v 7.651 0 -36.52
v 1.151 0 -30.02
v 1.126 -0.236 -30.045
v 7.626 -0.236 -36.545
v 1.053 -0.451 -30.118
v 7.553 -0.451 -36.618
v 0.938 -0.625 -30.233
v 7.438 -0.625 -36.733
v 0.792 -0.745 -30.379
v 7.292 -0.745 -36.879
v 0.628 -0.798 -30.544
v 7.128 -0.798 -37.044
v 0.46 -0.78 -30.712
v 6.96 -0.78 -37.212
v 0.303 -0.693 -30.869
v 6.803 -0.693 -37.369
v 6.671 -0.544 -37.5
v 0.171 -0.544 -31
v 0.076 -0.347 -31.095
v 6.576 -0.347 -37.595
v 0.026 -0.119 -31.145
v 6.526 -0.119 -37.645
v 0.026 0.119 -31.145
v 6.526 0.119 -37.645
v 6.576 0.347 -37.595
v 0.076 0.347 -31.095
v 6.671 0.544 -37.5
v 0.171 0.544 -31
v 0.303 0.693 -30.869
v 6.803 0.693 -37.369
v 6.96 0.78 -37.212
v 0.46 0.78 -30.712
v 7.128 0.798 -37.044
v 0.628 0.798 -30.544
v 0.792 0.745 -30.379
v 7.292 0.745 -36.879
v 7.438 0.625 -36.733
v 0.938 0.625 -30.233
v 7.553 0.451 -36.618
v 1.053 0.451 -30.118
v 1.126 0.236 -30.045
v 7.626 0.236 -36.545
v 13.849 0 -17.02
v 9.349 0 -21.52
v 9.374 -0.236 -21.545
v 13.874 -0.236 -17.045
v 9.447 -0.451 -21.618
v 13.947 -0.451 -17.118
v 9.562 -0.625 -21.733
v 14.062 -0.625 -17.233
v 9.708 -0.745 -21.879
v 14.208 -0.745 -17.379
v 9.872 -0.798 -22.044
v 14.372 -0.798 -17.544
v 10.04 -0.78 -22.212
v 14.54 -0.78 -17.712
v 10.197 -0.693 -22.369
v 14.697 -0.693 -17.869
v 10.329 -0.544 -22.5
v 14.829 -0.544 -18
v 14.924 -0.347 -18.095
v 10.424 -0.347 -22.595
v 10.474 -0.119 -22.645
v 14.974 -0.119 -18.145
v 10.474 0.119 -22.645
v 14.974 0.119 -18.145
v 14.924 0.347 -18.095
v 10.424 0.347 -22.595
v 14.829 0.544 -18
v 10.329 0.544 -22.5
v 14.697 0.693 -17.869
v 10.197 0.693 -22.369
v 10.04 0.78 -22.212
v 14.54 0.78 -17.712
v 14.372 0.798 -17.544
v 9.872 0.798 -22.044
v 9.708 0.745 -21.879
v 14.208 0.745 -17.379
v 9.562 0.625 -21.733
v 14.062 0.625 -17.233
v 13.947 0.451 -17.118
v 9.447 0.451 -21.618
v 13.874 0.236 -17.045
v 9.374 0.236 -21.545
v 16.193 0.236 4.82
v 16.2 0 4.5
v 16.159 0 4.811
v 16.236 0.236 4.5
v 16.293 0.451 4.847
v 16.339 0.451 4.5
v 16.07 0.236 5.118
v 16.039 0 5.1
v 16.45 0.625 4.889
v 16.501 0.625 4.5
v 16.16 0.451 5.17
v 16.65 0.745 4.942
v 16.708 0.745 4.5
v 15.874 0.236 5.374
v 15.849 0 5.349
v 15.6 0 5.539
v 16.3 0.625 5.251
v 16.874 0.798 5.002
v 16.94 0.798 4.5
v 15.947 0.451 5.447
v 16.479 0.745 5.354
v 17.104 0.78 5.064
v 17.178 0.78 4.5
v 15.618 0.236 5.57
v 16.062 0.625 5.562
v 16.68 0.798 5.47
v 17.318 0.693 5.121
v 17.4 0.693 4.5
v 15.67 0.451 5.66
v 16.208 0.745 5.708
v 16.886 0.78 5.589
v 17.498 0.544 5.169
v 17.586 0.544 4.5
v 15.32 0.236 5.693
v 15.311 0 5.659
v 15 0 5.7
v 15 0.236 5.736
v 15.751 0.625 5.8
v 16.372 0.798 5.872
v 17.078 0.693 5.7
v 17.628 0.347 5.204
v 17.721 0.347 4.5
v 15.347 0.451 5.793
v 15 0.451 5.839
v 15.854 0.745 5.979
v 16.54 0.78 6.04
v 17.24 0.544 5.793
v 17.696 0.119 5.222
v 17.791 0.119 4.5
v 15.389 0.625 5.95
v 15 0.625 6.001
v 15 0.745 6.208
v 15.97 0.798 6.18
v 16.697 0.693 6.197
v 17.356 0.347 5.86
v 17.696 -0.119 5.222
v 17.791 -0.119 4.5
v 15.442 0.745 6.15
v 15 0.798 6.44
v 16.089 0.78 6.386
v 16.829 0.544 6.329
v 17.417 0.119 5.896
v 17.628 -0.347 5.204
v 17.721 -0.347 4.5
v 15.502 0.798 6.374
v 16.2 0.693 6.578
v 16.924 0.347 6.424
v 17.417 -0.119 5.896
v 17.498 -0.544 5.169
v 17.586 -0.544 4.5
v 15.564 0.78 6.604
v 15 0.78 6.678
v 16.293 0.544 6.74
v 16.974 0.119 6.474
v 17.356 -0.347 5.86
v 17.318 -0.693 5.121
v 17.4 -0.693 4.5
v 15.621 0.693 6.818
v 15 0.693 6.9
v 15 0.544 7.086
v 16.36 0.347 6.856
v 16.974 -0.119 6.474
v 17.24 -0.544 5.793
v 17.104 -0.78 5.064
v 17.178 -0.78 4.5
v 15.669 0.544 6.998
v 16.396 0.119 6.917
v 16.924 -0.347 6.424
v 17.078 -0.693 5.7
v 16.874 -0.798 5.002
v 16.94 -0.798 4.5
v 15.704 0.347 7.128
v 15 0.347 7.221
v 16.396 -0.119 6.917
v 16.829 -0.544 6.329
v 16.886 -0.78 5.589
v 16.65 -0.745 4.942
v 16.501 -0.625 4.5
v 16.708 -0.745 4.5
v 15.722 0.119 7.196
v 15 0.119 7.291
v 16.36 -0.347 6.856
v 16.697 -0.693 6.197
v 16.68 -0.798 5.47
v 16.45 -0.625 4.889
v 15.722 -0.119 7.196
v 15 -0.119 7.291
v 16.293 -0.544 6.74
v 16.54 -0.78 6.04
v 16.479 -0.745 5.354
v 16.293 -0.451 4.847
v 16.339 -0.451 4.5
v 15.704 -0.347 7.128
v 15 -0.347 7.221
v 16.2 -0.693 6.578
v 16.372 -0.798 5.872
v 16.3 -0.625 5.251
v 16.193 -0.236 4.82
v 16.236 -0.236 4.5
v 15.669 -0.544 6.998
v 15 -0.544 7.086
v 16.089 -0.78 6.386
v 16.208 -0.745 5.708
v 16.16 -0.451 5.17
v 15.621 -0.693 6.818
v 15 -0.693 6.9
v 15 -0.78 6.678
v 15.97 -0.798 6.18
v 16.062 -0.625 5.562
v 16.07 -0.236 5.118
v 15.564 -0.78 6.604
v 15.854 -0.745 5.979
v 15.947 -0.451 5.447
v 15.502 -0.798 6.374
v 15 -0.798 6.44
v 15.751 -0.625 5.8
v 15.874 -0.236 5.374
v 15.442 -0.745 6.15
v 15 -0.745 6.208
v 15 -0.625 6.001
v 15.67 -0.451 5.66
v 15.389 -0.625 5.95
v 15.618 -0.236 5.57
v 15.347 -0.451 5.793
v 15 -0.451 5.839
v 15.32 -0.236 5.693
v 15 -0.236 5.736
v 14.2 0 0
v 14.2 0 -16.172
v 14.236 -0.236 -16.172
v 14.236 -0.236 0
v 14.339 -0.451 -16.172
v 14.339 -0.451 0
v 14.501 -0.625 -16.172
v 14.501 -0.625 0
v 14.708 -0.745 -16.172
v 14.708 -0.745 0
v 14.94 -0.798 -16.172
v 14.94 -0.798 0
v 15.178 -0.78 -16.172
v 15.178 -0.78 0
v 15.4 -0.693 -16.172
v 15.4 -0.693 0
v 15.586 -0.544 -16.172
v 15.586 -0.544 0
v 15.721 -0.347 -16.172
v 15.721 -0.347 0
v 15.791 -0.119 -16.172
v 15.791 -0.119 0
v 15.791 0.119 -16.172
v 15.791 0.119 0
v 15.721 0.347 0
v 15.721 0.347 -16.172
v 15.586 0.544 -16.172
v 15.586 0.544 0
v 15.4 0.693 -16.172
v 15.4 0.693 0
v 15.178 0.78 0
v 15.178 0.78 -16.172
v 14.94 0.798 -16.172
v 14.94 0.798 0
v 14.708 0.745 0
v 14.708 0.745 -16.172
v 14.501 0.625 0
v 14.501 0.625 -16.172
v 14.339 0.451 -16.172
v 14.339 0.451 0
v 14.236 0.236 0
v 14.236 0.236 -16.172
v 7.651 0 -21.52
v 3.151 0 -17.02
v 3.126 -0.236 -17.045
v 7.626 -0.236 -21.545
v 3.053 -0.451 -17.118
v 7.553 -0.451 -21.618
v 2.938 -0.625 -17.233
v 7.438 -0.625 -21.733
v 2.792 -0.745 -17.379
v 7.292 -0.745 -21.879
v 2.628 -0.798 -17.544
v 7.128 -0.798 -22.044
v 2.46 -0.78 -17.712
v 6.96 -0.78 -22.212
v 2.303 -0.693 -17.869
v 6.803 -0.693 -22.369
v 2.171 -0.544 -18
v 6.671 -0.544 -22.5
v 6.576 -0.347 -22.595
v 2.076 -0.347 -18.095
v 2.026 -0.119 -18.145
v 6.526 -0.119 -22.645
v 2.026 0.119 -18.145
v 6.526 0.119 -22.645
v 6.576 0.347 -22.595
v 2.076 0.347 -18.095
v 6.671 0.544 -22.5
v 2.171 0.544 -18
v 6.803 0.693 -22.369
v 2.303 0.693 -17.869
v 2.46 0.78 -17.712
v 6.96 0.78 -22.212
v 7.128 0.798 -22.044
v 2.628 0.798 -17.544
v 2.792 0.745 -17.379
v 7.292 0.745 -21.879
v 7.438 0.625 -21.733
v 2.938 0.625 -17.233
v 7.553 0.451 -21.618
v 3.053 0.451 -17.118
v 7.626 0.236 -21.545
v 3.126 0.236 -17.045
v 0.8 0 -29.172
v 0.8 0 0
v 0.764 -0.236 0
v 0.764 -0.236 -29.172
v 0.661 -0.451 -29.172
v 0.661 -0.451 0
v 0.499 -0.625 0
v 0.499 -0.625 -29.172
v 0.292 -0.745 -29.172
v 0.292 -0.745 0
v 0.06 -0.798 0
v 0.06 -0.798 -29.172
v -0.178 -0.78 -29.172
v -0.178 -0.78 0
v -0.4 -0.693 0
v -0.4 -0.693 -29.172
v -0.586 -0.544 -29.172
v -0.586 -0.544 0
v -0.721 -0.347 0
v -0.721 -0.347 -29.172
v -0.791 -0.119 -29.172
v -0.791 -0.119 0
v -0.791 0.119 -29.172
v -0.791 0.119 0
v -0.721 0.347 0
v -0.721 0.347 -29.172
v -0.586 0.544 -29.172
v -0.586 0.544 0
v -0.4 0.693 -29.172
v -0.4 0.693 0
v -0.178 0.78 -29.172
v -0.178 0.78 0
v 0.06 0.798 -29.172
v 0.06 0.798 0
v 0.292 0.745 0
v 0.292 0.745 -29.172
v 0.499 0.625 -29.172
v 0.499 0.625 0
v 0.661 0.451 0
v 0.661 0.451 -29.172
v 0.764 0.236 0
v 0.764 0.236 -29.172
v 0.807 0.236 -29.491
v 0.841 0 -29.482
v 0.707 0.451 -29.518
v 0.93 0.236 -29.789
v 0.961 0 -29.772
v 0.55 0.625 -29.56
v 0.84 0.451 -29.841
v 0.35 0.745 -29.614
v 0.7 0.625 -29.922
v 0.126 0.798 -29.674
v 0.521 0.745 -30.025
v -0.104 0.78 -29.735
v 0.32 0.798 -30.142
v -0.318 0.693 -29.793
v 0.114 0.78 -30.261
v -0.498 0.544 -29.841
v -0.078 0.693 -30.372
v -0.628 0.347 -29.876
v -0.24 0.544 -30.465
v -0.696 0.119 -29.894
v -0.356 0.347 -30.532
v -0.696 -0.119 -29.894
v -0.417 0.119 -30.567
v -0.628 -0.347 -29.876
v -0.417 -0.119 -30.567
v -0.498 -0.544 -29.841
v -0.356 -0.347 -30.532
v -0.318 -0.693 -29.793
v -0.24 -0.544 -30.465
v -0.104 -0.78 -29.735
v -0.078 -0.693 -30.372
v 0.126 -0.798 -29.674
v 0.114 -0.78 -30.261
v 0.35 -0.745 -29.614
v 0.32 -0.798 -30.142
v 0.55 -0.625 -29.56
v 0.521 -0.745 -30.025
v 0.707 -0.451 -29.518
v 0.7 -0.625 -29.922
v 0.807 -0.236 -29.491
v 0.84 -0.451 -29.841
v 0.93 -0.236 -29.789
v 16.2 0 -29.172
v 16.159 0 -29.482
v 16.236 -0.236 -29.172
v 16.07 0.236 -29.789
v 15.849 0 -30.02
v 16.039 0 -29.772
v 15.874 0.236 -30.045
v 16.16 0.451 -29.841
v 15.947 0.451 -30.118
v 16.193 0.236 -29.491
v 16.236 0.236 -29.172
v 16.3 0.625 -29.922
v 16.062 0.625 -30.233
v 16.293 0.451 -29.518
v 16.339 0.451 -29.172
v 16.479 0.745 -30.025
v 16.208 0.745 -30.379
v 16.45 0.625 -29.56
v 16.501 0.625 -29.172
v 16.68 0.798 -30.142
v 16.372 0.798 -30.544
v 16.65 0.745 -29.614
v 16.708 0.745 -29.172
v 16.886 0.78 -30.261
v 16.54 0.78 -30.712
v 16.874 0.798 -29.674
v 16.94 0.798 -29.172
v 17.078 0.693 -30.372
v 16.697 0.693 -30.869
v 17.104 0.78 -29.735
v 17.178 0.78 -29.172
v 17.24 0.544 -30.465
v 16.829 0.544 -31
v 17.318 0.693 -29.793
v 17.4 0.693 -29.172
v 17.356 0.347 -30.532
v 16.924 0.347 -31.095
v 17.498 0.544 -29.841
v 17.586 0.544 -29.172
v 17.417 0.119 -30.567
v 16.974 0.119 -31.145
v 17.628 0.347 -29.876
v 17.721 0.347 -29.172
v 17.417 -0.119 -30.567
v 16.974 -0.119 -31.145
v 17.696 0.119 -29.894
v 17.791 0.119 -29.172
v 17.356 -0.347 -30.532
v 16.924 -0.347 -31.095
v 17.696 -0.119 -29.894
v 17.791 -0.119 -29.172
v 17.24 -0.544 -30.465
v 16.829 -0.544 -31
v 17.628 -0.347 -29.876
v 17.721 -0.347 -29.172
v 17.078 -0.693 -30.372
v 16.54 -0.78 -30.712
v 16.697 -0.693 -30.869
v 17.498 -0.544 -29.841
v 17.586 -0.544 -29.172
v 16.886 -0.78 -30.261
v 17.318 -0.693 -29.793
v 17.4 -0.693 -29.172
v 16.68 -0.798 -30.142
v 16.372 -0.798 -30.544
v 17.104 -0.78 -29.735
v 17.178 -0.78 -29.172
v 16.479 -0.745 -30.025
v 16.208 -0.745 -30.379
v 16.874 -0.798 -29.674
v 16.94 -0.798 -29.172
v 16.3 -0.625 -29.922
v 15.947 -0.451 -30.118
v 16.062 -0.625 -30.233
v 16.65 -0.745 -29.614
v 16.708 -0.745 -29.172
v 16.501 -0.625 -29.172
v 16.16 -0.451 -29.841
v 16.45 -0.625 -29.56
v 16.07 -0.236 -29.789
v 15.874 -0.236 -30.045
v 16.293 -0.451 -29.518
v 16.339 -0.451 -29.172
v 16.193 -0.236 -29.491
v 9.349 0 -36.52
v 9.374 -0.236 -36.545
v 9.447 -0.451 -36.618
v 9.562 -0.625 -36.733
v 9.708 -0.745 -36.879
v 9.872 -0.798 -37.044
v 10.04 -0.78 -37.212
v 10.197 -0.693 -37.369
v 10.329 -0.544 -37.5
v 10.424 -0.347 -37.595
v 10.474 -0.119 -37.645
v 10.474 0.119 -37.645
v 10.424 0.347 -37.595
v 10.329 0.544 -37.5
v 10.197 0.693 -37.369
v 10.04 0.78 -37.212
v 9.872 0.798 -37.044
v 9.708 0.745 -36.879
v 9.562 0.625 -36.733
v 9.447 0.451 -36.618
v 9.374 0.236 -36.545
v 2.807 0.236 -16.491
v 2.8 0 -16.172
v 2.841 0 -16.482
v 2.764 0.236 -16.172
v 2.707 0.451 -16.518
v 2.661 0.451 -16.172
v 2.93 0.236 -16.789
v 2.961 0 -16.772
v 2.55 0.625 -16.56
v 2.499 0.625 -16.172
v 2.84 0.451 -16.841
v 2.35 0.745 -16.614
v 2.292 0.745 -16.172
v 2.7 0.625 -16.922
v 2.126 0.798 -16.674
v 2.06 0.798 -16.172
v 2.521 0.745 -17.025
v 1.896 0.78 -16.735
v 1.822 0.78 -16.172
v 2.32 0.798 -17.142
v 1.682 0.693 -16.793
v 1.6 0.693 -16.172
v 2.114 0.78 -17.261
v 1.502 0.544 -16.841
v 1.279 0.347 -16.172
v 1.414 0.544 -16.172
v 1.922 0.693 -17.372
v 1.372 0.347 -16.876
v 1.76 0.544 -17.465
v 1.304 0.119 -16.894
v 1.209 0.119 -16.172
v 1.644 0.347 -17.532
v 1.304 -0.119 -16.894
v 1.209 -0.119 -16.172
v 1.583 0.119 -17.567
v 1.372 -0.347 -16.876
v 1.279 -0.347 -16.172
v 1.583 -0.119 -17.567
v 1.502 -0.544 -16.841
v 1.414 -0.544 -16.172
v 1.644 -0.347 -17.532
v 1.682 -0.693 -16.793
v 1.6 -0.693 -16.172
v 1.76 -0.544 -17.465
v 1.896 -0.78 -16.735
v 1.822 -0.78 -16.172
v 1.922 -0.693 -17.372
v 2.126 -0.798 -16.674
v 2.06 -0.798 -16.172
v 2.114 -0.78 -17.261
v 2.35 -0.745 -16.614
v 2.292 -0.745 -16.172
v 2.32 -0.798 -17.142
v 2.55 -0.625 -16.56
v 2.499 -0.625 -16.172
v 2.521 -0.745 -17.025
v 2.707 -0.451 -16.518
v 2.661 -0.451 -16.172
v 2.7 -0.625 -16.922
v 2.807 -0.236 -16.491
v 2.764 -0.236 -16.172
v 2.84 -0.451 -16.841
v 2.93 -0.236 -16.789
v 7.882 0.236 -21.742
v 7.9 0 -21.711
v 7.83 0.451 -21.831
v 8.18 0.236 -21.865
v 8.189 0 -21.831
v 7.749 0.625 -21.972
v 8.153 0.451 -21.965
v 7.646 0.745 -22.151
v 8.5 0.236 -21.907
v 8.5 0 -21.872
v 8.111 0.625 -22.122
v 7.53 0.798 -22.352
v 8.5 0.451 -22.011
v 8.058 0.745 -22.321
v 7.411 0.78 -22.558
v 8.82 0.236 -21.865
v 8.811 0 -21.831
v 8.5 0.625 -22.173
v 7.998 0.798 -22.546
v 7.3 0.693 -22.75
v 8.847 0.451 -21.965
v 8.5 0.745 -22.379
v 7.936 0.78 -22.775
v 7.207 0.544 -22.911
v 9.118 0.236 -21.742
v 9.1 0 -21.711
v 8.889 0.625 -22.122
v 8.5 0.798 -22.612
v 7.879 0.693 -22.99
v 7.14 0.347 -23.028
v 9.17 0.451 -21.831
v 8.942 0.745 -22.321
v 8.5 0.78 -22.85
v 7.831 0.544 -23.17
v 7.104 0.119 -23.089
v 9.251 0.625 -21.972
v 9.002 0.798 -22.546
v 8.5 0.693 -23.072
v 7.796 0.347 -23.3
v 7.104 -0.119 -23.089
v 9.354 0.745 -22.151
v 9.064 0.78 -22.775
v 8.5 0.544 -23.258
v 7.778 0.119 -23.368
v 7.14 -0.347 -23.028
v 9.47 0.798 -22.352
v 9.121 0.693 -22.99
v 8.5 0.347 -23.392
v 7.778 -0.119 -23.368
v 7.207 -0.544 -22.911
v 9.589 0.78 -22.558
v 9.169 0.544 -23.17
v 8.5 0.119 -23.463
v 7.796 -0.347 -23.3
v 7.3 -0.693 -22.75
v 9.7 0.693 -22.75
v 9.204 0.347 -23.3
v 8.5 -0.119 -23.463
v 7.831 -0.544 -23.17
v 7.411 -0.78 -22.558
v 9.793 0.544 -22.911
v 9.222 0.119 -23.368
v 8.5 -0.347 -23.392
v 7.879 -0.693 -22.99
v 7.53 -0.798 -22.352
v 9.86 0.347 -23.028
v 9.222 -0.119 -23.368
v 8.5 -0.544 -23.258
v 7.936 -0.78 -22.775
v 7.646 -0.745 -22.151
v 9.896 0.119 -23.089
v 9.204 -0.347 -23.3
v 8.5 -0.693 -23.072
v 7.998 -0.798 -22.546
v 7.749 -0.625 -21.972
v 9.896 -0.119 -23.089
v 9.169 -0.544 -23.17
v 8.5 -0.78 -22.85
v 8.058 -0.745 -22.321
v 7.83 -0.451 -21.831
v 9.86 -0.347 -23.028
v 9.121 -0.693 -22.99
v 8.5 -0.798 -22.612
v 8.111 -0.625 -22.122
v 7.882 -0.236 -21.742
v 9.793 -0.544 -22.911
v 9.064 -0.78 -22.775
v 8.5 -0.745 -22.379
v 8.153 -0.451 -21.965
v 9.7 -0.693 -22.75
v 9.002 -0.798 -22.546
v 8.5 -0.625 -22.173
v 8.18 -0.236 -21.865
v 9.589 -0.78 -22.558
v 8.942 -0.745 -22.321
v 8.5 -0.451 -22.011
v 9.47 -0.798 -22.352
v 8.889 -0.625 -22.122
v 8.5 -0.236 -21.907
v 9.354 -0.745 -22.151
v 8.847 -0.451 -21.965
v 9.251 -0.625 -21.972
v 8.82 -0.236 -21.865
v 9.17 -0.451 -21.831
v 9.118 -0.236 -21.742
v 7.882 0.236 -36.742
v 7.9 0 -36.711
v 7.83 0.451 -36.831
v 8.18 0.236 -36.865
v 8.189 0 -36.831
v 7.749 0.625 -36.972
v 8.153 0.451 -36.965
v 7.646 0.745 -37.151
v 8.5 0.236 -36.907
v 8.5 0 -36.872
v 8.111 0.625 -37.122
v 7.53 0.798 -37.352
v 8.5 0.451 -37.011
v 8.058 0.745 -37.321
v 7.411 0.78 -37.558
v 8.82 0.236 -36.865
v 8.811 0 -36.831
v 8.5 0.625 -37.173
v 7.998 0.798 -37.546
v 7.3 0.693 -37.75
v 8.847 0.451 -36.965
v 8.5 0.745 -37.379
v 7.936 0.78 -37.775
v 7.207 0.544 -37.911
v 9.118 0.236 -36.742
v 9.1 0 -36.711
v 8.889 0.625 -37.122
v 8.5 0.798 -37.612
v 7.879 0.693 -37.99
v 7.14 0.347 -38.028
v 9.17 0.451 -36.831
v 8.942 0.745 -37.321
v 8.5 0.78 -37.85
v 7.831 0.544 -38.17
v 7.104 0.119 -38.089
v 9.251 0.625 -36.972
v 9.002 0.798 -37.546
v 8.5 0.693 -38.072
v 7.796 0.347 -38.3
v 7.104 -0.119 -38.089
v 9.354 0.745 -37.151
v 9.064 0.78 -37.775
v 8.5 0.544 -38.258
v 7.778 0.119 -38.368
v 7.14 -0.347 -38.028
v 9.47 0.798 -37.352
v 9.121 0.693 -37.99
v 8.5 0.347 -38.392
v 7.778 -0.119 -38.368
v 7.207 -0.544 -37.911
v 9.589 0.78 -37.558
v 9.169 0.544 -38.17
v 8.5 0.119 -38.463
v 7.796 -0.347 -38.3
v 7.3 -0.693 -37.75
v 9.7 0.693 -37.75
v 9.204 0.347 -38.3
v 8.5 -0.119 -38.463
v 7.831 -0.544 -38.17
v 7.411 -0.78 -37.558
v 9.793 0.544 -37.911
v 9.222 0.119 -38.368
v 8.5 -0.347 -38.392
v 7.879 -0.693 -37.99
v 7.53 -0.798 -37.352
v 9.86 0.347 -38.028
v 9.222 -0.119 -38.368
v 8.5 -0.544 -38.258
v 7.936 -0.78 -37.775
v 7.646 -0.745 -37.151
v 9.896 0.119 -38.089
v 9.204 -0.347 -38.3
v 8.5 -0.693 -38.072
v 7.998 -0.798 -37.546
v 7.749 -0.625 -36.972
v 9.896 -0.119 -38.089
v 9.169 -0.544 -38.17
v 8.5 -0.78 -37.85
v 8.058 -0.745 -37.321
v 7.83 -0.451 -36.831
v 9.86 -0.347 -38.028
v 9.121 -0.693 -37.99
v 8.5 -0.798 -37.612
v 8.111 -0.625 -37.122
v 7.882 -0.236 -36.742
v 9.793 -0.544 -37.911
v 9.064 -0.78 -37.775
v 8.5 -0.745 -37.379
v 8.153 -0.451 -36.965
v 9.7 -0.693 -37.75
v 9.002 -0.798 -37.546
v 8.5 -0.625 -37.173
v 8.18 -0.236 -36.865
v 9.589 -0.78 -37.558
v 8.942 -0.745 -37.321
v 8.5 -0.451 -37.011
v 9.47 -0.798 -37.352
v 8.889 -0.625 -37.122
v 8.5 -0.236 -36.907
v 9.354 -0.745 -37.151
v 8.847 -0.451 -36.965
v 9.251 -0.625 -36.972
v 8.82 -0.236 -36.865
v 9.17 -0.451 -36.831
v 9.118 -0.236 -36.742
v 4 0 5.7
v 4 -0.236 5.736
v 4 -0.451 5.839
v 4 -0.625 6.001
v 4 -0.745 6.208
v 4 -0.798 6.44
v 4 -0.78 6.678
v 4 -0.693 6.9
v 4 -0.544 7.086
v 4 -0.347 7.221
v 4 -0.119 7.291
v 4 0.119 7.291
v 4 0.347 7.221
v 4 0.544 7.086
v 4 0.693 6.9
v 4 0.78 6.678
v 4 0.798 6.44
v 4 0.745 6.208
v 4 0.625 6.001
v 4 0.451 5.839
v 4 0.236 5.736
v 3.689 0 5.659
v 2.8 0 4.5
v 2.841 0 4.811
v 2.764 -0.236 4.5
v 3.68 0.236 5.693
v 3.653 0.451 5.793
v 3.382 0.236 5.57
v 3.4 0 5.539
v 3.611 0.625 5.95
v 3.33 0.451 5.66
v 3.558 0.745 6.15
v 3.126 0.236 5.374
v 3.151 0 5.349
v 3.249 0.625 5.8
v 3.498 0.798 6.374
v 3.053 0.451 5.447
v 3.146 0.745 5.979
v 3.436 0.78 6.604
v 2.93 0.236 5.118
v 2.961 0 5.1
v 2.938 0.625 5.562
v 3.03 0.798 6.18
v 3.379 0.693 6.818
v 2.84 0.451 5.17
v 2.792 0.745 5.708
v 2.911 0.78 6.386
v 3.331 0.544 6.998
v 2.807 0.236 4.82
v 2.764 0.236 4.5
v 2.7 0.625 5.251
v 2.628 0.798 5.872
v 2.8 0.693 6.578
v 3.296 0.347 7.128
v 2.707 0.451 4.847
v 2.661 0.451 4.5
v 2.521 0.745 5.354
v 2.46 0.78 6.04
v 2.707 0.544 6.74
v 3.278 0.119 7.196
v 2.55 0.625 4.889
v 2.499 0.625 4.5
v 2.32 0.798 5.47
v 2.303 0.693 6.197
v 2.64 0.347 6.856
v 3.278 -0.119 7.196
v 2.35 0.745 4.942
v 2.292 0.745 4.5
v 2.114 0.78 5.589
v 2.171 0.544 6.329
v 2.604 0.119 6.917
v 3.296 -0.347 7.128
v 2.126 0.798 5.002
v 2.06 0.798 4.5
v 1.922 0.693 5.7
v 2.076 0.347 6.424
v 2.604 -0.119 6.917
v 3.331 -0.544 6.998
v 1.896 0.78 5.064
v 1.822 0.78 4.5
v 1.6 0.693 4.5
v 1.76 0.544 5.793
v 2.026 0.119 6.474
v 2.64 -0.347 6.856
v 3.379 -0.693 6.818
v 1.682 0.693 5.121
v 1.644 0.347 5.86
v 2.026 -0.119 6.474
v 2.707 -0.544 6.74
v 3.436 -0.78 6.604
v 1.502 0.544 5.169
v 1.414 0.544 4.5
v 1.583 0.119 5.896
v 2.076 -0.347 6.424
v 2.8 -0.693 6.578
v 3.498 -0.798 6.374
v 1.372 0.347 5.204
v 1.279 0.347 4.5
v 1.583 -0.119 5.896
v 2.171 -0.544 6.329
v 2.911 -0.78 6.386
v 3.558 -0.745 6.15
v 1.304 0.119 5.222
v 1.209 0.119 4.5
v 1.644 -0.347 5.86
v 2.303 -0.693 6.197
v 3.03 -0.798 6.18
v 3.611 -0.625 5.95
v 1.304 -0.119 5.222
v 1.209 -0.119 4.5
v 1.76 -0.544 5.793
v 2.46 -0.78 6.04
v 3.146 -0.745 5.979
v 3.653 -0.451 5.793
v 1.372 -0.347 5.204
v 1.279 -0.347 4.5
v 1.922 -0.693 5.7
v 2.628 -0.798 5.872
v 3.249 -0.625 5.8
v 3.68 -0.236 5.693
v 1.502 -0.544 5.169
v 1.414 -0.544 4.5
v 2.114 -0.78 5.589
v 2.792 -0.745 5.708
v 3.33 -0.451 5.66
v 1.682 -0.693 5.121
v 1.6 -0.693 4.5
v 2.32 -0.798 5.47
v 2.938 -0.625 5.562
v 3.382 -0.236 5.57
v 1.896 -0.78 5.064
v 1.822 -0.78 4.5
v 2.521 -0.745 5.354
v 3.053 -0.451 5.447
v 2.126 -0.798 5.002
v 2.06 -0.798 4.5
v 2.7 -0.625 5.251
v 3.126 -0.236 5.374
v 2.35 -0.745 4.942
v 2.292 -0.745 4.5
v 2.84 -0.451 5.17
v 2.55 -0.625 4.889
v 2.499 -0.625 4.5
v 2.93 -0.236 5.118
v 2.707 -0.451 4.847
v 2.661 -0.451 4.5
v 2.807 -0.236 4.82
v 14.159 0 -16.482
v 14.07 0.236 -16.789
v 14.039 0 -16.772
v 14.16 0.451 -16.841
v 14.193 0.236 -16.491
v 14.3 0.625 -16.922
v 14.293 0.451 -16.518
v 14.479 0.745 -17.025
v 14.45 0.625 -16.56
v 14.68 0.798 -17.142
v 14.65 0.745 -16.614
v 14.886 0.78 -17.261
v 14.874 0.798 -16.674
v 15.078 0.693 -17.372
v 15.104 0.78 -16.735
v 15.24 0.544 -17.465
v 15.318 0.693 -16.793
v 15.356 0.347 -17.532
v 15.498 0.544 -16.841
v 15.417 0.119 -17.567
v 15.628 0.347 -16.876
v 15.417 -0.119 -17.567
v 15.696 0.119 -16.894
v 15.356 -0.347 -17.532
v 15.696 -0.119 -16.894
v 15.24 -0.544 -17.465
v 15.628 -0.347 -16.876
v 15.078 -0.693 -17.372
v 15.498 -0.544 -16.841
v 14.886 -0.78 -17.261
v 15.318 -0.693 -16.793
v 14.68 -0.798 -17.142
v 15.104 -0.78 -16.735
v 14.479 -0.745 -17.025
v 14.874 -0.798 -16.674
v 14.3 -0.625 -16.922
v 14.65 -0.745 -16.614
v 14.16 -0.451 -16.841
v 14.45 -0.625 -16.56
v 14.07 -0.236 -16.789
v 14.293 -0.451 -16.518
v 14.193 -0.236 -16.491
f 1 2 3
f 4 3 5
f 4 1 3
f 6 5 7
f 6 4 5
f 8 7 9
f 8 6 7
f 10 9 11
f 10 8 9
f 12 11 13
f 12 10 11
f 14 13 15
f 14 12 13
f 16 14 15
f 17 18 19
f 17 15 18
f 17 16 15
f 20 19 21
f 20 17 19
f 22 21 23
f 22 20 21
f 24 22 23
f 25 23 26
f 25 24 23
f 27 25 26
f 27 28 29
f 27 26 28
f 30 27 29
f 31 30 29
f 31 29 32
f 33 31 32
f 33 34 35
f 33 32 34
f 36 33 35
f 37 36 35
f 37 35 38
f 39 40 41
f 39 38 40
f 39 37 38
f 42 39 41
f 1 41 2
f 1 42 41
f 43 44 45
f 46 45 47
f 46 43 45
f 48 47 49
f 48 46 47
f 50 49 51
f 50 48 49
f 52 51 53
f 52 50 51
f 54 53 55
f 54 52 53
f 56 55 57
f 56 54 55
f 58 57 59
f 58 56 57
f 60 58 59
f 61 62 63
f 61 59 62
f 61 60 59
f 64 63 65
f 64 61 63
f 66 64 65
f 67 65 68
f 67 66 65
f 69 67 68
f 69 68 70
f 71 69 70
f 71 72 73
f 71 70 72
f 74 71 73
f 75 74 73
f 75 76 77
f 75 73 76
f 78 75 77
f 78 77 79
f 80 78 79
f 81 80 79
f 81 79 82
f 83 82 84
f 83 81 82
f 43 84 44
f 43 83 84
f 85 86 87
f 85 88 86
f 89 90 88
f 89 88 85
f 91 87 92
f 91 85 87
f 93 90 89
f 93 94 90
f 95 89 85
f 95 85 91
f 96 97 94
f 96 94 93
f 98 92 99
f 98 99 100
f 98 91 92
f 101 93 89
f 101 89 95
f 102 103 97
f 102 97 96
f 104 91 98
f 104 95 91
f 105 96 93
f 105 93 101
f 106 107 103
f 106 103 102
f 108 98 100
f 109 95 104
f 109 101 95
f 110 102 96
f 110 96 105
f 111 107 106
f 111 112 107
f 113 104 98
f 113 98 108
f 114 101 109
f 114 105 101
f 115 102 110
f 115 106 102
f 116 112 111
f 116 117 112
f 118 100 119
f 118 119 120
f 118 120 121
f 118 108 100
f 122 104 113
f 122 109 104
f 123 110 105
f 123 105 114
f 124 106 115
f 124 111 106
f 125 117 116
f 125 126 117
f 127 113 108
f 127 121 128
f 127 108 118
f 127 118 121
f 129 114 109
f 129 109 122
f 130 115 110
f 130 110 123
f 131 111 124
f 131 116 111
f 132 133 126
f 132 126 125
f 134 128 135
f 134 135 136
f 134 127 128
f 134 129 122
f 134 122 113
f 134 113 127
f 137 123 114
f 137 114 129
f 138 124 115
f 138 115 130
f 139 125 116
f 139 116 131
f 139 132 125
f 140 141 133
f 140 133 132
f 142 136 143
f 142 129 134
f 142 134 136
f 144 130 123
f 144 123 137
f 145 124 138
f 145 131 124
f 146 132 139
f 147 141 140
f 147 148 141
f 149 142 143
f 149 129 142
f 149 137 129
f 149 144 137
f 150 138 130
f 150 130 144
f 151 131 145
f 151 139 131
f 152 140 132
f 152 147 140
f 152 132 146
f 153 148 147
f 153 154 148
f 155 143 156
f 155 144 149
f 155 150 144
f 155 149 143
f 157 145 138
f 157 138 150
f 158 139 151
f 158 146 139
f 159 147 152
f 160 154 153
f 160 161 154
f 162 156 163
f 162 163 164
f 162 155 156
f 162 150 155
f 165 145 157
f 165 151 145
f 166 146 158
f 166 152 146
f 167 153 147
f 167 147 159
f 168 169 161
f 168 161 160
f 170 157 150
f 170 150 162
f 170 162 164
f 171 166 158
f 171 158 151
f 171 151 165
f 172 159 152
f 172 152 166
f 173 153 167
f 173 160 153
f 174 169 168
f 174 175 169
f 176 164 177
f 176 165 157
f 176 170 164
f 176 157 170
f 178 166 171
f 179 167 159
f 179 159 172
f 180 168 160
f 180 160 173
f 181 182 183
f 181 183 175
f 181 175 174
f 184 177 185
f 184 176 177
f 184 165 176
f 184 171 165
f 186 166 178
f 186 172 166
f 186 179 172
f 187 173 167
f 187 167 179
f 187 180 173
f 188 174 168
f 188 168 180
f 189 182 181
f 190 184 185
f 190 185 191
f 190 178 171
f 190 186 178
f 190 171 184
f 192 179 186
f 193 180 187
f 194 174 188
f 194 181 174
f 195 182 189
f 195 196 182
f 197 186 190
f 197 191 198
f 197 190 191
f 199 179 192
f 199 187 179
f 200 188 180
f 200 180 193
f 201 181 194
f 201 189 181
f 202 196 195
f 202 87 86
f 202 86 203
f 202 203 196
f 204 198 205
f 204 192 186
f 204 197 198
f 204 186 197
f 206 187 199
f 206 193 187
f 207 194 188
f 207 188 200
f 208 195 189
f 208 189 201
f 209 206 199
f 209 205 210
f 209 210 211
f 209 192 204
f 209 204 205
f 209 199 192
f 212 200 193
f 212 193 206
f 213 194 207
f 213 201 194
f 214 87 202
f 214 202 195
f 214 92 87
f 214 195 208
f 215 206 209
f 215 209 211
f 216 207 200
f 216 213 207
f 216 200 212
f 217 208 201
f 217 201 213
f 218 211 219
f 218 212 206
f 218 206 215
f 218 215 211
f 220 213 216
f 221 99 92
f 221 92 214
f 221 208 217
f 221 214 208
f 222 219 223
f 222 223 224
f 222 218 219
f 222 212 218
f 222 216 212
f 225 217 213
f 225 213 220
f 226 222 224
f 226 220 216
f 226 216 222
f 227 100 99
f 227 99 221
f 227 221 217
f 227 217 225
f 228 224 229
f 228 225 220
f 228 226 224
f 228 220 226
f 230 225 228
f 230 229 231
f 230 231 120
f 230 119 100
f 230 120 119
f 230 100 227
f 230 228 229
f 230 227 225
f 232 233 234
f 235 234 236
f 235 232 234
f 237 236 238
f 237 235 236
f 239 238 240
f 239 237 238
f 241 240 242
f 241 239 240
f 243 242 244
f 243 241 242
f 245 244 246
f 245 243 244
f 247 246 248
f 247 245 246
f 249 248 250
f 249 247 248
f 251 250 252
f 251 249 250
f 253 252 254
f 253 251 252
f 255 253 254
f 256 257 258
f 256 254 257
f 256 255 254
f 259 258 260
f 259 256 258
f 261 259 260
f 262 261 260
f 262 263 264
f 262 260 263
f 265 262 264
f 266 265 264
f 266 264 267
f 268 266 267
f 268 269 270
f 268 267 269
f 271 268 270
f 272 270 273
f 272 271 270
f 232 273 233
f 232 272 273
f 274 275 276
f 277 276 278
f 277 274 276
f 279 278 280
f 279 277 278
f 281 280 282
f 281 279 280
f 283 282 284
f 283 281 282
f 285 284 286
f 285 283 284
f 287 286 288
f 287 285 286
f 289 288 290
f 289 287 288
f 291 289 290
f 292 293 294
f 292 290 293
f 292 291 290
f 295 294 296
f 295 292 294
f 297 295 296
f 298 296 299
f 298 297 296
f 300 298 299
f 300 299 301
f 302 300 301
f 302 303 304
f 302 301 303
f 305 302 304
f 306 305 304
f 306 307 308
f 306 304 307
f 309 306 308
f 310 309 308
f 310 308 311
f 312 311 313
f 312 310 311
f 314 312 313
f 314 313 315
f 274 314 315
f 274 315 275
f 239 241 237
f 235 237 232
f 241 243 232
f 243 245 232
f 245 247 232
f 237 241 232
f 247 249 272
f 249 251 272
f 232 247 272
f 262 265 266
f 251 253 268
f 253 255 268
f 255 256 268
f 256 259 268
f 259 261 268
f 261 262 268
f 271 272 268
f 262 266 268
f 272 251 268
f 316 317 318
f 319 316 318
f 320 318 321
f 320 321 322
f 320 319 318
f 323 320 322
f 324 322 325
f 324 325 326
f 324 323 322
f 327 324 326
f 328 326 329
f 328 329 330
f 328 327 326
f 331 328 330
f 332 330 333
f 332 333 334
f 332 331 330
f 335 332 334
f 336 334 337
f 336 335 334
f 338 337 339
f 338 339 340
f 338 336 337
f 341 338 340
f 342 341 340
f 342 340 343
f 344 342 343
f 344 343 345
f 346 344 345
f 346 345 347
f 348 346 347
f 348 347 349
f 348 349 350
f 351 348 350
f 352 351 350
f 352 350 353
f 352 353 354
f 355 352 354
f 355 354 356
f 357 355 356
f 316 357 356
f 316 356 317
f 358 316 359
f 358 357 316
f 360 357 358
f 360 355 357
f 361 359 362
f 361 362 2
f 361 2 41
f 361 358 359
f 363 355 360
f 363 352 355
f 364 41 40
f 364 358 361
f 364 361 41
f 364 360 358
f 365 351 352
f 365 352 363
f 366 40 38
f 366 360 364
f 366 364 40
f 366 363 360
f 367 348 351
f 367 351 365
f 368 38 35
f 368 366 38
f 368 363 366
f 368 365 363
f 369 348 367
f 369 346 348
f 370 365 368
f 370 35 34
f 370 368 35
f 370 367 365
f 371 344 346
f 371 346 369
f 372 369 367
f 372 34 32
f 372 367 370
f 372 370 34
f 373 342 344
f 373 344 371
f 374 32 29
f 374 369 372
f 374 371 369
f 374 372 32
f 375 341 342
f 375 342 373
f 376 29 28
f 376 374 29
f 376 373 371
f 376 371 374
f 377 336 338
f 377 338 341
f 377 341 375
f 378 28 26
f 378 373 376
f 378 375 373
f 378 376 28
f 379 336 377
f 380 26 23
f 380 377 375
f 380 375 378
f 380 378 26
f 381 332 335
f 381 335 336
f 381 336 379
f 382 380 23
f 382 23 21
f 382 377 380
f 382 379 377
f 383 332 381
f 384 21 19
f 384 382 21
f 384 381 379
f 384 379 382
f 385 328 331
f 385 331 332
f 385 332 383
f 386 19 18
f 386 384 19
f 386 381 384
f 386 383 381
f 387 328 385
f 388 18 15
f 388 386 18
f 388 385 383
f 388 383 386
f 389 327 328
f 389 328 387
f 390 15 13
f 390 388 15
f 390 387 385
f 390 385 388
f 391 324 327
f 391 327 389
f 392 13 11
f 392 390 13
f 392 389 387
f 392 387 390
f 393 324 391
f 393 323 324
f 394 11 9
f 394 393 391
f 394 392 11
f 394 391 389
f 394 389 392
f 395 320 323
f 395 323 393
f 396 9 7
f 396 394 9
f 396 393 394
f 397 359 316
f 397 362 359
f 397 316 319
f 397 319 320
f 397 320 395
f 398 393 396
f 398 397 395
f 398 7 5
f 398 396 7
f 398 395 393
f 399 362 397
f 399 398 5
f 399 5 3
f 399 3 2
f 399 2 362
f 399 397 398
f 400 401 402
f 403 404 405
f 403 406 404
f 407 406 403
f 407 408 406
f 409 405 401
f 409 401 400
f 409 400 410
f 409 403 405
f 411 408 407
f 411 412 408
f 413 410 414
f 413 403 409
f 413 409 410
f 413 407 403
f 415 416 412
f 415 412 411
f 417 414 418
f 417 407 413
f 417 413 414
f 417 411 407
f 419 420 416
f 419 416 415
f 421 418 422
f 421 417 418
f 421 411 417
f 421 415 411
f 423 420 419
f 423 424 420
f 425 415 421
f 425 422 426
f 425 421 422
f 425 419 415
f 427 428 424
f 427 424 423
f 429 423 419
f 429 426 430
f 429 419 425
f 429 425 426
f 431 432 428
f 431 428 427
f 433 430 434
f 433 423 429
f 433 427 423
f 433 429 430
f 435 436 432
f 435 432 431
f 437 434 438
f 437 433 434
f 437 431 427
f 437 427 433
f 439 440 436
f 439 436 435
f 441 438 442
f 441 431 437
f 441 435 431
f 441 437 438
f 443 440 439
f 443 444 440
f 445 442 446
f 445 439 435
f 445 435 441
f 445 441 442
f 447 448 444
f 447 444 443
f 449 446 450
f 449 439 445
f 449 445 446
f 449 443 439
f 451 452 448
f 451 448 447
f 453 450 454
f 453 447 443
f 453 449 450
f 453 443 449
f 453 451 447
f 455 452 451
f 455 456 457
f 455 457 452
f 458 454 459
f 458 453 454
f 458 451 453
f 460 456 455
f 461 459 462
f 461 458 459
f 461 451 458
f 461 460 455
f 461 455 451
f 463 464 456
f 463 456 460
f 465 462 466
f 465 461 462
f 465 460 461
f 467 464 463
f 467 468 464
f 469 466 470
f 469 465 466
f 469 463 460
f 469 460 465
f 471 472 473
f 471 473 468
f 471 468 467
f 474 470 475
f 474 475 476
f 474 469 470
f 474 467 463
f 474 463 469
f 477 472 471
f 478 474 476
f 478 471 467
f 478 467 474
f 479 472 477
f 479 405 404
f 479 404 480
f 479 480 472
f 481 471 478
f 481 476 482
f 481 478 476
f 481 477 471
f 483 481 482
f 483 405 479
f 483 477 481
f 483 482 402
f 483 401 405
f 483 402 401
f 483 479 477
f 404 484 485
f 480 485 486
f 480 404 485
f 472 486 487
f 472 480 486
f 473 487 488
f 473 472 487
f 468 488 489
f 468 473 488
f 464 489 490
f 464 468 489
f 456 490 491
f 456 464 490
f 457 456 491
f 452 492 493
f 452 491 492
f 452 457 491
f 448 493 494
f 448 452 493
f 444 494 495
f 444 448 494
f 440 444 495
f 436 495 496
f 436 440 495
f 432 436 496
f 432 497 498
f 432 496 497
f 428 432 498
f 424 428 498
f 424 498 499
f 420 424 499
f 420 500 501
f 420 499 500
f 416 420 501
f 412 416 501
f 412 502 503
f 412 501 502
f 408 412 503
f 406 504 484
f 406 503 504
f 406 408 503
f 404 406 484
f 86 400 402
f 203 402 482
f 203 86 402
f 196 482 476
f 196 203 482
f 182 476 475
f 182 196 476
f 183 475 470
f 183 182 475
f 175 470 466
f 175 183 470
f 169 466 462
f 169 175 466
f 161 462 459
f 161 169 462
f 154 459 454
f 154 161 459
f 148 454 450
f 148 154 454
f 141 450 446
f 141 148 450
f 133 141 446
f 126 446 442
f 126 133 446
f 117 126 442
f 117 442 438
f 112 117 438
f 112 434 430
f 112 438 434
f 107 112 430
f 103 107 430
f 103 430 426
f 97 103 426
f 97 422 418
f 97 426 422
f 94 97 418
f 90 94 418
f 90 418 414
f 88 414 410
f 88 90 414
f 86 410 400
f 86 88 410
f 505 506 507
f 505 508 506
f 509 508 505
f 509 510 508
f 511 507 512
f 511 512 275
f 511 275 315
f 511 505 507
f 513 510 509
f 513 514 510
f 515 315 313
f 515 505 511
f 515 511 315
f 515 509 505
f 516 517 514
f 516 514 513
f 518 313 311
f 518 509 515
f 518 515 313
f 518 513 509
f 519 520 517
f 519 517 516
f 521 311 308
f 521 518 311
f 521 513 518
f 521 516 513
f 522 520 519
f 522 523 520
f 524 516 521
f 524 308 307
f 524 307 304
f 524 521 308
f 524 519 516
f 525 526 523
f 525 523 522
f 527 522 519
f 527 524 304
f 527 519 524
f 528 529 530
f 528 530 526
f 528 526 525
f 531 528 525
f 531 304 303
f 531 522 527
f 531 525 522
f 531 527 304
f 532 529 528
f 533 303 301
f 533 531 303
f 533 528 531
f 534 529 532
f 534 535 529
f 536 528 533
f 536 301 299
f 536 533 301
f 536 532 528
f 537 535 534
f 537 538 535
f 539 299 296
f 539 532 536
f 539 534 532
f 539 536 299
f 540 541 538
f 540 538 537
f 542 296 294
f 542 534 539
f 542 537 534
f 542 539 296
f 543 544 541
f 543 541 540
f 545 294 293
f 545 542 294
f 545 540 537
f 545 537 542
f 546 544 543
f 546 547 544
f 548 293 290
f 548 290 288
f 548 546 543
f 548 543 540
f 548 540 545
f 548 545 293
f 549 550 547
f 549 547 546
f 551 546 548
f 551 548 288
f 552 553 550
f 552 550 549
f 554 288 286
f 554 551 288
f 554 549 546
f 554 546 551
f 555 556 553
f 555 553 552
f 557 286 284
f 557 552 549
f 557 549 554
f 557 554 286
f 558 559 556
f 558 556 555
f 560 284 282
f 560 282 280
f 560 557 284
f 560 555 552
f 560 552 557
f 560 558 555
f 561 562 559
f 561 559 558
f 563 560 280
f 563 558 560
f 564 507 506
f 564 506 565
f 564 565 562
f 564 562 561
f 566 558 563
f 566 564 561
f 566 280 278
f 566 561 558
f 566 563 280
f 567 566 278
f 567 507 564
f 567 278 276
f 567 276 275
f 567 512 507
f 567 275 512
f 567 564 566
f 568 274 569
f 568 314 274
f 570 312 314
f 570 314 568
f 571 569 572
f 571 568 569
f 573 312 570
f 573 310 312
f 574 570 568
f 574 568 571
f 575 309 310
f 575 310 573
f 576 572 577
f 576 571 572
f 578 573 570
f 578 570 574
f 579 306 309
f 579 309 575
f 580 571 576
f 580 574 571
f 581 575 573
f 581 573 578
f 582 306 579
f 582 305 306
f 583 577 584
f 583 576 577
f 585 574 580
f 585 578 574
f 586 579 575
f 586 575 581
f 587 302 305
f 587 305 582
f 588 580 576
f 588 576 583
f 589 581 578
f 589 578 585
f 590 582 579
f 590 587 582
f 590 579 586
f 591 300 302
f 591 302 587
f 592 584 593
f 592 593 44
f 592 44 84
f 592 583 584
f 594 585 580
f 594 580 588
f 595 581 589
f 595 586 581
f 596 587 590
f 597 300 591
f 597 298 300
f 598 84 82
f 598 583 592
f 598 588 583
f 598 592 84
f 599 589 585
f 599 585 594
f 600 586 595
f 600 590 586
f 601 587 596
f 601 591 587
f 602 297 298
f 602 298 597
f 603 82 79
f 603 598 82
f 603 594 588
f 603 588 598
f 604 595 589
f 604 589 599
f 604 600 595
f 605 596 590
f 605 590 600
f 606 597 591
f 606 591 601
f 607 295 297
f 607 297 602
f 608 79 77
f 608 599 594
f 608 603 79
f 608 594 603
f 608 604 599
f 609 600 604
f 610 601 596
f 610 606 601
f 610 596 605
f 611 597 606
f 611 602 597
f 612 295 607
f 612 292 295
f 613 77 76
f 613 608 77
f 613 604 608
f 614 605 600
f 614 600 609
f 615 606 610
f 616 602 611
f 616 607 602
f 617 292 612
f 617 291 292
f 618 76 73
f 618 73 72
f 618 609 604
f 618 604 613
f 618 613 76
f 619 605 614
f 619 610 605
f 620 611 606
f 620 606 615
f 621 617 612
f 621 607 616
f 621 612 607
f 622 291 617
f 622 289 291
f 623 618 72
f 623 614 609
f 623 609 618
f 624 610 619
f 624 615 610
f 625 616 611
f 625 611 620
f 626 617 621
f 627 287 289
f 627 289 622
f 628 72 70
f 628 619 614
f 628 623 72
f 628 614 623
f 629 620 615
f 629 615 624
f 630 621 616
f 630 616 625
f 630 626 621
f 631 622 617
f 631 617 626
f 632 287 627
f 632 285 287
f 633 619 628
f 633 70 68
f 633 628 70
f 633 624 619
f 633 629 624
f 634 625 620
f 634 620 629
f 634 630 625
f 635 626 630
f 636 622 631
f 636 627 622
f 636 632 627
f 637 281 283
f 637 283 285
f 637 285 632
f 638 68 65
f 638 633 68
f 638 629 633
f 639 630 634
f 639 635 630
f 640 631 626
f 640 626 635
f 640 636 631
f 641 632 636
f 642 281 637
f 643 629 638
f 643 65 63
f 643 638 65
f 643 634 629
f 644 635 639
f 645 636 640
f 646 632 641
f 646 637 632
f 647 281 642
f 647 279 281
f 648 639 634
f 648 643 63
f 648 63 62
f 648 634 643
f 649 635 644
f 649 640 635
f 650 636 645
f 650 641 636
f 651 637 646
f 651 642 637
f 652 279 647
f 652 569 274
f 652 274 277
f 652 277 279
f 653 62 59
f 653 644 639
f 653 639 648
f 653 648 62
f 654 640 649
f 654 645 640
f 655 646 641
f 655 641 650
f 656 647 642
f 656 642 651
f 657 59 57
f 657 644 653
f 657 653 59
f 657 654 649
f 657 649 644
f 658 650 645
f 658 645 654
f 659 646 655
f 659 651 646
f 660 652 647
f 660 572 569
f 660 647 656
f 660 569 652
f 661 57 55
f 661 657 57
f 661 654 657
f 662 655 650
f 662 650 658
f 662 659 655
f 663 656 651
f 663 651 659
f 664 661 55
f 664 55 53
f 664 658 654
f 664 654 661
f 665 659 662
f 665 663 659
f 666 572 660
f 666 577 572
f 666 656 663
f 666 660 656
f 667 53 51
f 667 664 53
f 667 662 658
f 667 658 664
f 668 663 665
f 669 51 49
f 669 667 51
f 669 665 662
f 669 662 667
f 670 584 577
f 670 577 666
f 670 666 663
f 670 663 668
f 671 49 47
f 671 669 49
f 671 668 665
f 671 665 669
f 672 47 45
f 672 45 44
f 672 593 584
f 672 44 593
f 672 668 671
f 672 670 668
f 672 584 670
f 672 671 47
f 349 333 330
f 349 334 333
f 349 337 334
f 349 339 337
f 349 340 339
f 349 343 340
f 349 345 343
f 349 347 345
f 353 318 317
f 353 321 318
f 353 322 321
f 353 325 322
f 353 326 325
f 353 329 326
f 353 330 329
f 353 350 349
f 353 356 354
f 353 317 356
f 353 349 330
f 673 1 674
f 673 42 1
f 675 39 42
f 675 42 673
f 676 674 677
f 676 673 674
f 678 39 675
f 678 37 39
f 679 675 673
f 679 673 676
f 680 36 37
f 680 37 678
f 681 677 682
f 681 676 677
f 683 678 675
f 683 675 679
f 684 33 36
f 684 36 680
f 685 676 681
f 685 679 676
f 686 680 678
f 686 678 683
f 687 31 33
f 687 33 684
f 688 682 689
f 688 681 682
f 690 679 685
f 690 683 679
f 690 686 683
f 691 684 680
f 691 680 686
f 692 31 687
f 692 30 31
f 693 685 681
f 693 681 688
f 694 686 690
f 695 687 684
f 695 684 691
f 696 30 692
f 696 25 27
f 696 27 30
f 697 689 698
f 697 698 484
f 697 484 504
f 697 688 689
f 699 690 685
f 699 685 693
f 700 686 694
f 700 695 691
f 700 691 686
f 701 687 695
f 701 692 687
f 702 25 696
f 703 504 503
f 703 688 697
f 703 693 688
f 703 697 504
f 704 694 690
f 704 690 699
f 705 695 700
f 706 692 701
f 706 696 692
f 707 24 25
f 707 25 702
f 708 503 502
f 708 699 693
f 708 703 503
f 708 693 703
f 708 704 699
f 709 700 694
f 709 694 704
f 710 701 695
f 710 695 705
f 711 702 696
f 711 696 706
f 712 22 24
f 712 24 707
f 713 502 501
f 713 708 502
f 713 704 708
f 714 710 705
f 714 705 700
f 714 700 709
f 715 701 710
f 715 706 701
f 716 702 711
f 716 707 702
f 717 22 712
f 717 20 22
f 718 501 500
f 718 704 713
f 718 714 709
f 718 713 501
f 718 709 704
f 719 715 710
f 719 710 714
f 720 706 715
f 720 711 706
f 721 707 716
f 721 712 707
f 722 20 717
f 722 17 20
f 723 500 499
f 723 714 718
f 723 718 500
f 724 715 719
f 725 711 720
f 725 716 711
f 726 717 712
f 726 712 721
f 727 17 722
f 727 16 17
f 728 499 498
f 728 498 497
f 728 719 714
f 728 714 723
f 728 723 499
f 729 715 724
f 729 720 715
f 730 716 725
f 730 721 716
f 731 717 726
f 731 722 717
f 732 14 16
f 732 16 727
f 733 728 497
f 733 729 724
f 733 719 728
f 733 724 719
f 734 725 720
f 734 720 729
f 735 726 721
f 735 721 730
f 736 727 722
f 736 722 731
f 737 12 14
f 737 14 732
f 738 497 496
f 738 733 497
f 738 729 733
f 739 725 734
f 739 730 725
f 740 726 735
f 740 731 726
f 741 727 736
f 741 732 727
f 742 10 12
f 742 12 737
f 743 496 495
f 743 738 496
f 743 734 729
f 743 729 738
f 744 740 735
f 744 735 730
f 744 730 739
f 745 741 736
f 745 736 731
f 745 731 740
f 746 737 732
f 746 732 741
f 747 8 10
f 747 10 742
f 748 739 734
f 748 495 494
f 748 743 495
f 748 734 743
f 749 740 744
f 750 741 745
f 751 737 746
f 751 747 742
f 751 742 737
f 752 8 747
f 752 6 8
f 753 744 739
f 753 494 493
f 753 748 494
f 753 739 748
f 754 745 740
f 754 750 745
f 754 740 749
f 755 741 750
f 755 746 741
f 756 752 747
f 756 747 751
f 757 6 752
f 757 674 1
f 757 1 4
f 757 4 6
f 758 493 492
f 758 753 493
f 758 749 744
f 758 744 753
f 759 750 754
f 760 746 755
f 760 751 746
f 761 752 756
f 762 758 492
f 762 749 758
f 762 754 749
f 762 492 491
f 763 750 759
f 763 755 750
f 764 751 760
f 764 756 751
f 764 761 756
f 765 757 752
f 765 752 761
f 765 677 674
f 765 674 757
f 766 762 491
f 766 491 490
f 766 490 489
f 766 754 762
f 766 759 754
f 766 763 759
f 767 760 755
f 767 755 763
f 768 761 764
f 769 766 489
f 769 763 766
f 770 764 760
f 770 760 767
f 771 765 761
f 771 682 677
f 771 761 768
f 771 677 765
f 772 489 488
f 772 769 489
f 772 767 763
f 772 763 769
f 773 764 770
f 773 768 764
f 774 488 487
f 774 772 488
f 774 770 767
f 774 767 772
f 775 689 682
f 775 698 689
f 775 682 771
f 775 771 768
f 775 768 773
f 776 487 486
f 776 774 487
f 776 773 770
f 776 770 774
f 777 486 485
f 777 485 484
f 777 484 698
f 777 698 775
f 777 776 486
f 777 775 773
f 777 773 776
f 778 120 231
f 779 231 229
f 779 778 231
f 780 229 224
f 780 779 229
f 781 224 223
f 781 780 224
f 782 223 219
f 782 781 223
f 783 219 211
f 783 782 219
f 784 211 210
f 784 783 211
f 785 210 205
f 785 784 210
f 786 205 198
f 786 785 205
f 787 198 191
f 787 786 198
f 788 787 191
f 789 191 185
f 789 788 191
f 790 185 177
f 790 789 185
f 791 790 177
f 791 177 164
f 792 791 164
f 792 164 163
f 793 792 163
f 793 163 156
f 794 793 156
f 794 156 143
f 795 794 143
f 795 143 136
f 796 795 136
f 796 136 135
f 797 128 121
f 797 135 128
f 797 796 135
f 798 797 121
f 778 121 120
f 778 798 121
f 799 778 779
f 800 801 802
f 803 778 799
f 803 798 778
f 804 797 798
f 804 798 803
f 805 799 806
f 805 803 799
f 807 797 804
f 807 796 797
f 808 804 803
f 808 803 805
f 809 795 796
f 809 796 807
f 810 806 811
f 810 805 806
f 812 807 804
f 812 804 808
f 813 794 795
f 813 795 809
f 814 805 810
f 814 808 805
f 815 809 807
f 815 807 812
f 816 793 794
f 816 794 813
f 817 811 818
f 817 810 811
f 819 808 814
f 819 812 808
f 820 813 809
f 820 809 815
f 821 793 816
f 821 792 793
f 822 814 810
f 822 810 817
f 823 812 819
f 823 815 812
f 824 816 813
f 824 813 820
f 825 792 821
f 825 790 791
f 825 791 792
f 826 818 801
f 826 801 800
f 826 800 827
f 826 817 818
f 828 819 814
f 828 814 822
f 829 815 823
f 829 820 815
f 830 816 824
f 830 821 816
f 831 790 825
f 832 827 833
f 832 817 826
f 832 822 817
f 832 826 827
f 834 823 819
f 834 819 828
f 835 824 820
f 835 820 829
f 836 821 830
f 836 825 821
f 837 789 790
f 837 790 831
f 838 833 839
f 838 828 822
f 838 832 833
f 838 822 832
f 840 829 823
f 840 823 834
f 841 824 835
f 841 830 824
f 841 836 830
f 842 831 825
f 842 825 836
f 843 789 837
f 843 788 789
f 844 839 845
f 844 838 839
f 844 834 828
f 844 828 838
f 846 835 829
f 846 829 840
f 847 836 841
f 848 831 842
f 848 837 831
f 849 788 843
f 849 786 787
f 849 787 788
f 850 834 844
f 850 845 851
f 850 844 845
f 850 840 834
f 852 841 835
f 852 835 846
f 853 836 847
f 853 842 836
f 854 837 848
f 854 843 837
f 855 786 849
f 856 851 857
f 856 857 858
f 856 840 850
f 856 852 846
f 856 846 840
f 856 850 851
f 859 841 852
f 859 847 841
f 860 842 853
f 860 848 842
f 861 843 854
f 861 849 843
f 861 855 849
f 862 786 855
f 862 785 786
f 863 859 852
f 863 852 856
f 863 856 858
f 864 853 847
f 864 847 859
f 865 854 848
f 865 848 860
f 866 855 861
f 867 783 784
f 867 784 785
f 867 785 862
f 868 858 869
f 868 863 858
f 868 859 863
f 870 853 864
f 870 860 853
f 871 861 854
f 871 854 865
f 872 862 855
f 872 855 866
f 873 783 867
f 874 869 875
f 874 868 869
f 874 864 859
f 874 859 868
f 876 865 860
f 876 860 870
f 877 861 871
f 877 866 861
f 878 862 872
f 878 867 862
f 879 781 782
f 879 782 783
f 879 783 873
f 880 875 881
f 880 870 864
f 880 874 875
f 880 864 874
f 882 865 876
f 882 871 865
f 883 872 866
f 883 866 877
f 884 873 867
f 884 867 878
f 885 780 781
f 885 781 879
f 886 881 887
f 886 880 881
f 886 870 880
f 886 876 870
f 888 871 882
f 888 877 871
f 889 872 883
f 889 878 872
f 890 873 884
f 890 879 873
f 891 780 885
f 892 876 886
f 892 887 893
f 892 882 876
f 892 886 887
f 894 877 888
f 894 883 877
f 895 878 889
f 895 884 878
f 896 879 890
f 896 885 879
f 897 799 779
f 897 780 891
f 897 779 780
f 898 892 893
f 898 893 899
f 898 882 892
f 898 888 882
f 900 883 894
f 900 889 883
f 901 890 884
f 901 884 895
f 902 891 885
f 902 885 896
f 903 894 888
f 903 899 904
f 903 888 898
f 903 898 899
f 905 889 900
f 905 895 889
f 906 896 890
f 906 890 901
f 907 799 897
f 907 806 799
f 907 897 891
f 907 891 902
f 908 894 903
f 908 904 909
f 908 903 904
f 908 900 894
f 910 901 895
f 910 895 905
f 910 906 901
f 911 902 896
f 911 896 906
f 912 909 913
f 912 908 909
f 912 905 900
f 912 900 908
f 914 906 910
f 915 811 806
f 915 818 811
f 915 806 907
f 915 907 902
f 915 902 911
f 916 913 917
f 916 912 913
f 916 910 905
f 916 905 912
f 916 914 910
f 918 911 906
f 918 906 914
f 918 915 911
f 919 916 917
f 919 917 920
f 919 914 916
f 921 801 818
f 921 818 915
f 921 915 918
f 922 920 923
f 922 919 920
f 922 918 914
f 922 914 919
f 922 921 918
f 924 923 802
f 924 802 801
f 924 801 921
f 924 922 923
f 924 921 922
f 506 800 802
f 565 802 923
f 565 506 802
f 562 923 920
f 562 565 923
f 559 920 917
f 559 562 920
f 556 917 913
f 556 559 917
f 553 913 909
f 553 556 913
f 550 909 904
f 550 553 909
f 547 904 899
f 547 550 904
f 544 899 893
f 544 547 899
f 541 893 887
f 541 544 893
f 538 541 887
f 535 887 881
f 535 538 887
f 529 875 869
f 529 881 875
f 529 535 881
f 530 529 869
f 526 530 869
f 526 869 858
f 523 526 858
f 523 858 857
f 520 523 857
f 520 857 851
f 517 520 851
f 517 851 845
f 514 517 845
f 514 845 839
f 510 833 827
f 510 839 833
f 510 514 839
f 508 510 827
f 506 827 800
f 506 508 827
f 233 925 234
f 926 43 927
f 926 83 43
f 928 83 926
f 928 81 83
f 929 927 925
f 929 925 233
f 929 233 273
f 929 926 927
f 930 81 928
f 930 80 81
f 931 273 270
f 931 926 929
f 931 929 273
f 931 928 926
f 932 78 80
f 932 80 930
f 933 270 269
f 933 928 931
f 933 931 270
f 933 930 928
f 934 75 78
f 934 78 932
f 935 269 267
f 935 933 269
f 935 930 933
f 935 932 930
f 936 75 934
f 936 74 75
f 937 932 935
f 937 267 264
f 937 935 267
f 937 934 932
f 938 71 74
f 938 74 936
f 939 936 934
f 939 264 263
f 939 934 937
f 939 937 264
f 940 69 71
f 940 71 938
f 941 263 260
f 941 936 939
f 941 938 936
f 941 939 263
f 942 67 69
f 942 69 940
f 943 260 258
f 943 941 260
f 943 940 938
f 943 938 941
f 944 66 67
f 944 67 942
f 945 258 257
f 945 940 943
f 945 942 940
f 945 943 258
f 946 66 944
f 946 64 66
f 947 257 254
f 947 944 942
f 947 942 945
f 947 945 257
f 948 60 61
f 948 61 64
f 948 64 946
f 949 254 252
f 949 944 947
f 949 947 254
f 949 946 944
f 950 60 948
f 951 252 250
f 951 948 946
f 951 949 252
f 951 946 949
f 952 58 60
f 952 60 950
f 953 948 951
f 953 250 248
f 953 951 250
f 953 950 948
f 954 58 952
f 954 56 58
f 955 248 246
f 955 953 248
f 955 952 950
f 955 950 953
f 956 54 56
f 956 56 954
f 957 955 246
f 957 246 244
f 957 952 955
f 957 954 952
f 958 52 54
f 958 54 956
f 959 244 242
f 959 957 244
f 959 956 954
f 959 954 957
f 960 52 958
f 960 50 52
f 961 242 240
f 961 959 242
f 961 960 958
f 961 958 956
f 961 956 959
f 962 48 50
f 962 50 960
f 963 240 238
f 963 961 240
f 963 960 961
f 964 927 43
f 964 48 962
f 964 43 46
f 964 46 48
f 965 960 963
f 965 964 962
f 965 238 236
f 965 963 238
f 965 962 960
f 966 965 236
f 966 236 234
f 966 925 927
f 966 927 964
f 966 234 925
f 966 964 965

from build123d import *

# Parameters (mm, degrees)
SKETCH2_R = 0.8


with BuildPart() as part:
    # Sweep1: sweep along a path in Sketch1
    with BuildLine(Plane(origin=(0, 0, 0), x_dir=(1, 0, 0), z_dir=(0, 1, 0))) as sweep1_path:
        Line((0, 0), (0, 29.171572875))
        ThreePointArc((0, 29.171572875), (0.152240935, 29.93693974), (0.585786438, 30.585786438))
        Line((0.585786438, 30.585786438), (7.085786438, 37.085786438))
        ThreePointArc((7.085786438, 37.085786438), (8.5, 37.671572875), (9.914213562, 37.085786438))
        Line((9.914213562, 37.085786438), (16.414213562, 30.585786438))
        ThreePointArc((16.414213562, 30.585786438), (16.847759065, 29.93693974), (17, 29.171572875))
        Line((17, 29.171572875), (17, -4.5))
        ThreePointArc((17, -4.5), (16.414213562, -5.914213562), (15, -6.5))
        Line((15, -6.5), (4, -6.5))
        ThreePointArc((4, -6.5), (2.585786438, -5.914213562), (2, -4.5))
        Line((2, -4.5), (2, 16.171572875))
        ThreePointArc((2, 16.171572875), (2.152240935, 16.93693974), (2.585786438, 17.585786438))
        Line((2.585786438, 17.585786438), (7.085786438, 22.085786438))
        ThreePointArc((7.085786438, 22.085786438), (8.5, 22.671572875), (9.914213562, 22.085786438))
        Line((9.914213562, 22.085786438), (14.414213562, 17.585786438))
        ThreePointArc((14.414213562, 17.585786438), (14.847759065, 16.93693974), (15, 16.171572875))
        Line((15, 16.171572875), (15, 0))
    # Sketch2 → Sweep1 (sweep)
    with BuildSketch(Plane.XY):
        Circle(SKETCH2_R)
    sweep(path=sweep1_path.line)


solid = part.part
